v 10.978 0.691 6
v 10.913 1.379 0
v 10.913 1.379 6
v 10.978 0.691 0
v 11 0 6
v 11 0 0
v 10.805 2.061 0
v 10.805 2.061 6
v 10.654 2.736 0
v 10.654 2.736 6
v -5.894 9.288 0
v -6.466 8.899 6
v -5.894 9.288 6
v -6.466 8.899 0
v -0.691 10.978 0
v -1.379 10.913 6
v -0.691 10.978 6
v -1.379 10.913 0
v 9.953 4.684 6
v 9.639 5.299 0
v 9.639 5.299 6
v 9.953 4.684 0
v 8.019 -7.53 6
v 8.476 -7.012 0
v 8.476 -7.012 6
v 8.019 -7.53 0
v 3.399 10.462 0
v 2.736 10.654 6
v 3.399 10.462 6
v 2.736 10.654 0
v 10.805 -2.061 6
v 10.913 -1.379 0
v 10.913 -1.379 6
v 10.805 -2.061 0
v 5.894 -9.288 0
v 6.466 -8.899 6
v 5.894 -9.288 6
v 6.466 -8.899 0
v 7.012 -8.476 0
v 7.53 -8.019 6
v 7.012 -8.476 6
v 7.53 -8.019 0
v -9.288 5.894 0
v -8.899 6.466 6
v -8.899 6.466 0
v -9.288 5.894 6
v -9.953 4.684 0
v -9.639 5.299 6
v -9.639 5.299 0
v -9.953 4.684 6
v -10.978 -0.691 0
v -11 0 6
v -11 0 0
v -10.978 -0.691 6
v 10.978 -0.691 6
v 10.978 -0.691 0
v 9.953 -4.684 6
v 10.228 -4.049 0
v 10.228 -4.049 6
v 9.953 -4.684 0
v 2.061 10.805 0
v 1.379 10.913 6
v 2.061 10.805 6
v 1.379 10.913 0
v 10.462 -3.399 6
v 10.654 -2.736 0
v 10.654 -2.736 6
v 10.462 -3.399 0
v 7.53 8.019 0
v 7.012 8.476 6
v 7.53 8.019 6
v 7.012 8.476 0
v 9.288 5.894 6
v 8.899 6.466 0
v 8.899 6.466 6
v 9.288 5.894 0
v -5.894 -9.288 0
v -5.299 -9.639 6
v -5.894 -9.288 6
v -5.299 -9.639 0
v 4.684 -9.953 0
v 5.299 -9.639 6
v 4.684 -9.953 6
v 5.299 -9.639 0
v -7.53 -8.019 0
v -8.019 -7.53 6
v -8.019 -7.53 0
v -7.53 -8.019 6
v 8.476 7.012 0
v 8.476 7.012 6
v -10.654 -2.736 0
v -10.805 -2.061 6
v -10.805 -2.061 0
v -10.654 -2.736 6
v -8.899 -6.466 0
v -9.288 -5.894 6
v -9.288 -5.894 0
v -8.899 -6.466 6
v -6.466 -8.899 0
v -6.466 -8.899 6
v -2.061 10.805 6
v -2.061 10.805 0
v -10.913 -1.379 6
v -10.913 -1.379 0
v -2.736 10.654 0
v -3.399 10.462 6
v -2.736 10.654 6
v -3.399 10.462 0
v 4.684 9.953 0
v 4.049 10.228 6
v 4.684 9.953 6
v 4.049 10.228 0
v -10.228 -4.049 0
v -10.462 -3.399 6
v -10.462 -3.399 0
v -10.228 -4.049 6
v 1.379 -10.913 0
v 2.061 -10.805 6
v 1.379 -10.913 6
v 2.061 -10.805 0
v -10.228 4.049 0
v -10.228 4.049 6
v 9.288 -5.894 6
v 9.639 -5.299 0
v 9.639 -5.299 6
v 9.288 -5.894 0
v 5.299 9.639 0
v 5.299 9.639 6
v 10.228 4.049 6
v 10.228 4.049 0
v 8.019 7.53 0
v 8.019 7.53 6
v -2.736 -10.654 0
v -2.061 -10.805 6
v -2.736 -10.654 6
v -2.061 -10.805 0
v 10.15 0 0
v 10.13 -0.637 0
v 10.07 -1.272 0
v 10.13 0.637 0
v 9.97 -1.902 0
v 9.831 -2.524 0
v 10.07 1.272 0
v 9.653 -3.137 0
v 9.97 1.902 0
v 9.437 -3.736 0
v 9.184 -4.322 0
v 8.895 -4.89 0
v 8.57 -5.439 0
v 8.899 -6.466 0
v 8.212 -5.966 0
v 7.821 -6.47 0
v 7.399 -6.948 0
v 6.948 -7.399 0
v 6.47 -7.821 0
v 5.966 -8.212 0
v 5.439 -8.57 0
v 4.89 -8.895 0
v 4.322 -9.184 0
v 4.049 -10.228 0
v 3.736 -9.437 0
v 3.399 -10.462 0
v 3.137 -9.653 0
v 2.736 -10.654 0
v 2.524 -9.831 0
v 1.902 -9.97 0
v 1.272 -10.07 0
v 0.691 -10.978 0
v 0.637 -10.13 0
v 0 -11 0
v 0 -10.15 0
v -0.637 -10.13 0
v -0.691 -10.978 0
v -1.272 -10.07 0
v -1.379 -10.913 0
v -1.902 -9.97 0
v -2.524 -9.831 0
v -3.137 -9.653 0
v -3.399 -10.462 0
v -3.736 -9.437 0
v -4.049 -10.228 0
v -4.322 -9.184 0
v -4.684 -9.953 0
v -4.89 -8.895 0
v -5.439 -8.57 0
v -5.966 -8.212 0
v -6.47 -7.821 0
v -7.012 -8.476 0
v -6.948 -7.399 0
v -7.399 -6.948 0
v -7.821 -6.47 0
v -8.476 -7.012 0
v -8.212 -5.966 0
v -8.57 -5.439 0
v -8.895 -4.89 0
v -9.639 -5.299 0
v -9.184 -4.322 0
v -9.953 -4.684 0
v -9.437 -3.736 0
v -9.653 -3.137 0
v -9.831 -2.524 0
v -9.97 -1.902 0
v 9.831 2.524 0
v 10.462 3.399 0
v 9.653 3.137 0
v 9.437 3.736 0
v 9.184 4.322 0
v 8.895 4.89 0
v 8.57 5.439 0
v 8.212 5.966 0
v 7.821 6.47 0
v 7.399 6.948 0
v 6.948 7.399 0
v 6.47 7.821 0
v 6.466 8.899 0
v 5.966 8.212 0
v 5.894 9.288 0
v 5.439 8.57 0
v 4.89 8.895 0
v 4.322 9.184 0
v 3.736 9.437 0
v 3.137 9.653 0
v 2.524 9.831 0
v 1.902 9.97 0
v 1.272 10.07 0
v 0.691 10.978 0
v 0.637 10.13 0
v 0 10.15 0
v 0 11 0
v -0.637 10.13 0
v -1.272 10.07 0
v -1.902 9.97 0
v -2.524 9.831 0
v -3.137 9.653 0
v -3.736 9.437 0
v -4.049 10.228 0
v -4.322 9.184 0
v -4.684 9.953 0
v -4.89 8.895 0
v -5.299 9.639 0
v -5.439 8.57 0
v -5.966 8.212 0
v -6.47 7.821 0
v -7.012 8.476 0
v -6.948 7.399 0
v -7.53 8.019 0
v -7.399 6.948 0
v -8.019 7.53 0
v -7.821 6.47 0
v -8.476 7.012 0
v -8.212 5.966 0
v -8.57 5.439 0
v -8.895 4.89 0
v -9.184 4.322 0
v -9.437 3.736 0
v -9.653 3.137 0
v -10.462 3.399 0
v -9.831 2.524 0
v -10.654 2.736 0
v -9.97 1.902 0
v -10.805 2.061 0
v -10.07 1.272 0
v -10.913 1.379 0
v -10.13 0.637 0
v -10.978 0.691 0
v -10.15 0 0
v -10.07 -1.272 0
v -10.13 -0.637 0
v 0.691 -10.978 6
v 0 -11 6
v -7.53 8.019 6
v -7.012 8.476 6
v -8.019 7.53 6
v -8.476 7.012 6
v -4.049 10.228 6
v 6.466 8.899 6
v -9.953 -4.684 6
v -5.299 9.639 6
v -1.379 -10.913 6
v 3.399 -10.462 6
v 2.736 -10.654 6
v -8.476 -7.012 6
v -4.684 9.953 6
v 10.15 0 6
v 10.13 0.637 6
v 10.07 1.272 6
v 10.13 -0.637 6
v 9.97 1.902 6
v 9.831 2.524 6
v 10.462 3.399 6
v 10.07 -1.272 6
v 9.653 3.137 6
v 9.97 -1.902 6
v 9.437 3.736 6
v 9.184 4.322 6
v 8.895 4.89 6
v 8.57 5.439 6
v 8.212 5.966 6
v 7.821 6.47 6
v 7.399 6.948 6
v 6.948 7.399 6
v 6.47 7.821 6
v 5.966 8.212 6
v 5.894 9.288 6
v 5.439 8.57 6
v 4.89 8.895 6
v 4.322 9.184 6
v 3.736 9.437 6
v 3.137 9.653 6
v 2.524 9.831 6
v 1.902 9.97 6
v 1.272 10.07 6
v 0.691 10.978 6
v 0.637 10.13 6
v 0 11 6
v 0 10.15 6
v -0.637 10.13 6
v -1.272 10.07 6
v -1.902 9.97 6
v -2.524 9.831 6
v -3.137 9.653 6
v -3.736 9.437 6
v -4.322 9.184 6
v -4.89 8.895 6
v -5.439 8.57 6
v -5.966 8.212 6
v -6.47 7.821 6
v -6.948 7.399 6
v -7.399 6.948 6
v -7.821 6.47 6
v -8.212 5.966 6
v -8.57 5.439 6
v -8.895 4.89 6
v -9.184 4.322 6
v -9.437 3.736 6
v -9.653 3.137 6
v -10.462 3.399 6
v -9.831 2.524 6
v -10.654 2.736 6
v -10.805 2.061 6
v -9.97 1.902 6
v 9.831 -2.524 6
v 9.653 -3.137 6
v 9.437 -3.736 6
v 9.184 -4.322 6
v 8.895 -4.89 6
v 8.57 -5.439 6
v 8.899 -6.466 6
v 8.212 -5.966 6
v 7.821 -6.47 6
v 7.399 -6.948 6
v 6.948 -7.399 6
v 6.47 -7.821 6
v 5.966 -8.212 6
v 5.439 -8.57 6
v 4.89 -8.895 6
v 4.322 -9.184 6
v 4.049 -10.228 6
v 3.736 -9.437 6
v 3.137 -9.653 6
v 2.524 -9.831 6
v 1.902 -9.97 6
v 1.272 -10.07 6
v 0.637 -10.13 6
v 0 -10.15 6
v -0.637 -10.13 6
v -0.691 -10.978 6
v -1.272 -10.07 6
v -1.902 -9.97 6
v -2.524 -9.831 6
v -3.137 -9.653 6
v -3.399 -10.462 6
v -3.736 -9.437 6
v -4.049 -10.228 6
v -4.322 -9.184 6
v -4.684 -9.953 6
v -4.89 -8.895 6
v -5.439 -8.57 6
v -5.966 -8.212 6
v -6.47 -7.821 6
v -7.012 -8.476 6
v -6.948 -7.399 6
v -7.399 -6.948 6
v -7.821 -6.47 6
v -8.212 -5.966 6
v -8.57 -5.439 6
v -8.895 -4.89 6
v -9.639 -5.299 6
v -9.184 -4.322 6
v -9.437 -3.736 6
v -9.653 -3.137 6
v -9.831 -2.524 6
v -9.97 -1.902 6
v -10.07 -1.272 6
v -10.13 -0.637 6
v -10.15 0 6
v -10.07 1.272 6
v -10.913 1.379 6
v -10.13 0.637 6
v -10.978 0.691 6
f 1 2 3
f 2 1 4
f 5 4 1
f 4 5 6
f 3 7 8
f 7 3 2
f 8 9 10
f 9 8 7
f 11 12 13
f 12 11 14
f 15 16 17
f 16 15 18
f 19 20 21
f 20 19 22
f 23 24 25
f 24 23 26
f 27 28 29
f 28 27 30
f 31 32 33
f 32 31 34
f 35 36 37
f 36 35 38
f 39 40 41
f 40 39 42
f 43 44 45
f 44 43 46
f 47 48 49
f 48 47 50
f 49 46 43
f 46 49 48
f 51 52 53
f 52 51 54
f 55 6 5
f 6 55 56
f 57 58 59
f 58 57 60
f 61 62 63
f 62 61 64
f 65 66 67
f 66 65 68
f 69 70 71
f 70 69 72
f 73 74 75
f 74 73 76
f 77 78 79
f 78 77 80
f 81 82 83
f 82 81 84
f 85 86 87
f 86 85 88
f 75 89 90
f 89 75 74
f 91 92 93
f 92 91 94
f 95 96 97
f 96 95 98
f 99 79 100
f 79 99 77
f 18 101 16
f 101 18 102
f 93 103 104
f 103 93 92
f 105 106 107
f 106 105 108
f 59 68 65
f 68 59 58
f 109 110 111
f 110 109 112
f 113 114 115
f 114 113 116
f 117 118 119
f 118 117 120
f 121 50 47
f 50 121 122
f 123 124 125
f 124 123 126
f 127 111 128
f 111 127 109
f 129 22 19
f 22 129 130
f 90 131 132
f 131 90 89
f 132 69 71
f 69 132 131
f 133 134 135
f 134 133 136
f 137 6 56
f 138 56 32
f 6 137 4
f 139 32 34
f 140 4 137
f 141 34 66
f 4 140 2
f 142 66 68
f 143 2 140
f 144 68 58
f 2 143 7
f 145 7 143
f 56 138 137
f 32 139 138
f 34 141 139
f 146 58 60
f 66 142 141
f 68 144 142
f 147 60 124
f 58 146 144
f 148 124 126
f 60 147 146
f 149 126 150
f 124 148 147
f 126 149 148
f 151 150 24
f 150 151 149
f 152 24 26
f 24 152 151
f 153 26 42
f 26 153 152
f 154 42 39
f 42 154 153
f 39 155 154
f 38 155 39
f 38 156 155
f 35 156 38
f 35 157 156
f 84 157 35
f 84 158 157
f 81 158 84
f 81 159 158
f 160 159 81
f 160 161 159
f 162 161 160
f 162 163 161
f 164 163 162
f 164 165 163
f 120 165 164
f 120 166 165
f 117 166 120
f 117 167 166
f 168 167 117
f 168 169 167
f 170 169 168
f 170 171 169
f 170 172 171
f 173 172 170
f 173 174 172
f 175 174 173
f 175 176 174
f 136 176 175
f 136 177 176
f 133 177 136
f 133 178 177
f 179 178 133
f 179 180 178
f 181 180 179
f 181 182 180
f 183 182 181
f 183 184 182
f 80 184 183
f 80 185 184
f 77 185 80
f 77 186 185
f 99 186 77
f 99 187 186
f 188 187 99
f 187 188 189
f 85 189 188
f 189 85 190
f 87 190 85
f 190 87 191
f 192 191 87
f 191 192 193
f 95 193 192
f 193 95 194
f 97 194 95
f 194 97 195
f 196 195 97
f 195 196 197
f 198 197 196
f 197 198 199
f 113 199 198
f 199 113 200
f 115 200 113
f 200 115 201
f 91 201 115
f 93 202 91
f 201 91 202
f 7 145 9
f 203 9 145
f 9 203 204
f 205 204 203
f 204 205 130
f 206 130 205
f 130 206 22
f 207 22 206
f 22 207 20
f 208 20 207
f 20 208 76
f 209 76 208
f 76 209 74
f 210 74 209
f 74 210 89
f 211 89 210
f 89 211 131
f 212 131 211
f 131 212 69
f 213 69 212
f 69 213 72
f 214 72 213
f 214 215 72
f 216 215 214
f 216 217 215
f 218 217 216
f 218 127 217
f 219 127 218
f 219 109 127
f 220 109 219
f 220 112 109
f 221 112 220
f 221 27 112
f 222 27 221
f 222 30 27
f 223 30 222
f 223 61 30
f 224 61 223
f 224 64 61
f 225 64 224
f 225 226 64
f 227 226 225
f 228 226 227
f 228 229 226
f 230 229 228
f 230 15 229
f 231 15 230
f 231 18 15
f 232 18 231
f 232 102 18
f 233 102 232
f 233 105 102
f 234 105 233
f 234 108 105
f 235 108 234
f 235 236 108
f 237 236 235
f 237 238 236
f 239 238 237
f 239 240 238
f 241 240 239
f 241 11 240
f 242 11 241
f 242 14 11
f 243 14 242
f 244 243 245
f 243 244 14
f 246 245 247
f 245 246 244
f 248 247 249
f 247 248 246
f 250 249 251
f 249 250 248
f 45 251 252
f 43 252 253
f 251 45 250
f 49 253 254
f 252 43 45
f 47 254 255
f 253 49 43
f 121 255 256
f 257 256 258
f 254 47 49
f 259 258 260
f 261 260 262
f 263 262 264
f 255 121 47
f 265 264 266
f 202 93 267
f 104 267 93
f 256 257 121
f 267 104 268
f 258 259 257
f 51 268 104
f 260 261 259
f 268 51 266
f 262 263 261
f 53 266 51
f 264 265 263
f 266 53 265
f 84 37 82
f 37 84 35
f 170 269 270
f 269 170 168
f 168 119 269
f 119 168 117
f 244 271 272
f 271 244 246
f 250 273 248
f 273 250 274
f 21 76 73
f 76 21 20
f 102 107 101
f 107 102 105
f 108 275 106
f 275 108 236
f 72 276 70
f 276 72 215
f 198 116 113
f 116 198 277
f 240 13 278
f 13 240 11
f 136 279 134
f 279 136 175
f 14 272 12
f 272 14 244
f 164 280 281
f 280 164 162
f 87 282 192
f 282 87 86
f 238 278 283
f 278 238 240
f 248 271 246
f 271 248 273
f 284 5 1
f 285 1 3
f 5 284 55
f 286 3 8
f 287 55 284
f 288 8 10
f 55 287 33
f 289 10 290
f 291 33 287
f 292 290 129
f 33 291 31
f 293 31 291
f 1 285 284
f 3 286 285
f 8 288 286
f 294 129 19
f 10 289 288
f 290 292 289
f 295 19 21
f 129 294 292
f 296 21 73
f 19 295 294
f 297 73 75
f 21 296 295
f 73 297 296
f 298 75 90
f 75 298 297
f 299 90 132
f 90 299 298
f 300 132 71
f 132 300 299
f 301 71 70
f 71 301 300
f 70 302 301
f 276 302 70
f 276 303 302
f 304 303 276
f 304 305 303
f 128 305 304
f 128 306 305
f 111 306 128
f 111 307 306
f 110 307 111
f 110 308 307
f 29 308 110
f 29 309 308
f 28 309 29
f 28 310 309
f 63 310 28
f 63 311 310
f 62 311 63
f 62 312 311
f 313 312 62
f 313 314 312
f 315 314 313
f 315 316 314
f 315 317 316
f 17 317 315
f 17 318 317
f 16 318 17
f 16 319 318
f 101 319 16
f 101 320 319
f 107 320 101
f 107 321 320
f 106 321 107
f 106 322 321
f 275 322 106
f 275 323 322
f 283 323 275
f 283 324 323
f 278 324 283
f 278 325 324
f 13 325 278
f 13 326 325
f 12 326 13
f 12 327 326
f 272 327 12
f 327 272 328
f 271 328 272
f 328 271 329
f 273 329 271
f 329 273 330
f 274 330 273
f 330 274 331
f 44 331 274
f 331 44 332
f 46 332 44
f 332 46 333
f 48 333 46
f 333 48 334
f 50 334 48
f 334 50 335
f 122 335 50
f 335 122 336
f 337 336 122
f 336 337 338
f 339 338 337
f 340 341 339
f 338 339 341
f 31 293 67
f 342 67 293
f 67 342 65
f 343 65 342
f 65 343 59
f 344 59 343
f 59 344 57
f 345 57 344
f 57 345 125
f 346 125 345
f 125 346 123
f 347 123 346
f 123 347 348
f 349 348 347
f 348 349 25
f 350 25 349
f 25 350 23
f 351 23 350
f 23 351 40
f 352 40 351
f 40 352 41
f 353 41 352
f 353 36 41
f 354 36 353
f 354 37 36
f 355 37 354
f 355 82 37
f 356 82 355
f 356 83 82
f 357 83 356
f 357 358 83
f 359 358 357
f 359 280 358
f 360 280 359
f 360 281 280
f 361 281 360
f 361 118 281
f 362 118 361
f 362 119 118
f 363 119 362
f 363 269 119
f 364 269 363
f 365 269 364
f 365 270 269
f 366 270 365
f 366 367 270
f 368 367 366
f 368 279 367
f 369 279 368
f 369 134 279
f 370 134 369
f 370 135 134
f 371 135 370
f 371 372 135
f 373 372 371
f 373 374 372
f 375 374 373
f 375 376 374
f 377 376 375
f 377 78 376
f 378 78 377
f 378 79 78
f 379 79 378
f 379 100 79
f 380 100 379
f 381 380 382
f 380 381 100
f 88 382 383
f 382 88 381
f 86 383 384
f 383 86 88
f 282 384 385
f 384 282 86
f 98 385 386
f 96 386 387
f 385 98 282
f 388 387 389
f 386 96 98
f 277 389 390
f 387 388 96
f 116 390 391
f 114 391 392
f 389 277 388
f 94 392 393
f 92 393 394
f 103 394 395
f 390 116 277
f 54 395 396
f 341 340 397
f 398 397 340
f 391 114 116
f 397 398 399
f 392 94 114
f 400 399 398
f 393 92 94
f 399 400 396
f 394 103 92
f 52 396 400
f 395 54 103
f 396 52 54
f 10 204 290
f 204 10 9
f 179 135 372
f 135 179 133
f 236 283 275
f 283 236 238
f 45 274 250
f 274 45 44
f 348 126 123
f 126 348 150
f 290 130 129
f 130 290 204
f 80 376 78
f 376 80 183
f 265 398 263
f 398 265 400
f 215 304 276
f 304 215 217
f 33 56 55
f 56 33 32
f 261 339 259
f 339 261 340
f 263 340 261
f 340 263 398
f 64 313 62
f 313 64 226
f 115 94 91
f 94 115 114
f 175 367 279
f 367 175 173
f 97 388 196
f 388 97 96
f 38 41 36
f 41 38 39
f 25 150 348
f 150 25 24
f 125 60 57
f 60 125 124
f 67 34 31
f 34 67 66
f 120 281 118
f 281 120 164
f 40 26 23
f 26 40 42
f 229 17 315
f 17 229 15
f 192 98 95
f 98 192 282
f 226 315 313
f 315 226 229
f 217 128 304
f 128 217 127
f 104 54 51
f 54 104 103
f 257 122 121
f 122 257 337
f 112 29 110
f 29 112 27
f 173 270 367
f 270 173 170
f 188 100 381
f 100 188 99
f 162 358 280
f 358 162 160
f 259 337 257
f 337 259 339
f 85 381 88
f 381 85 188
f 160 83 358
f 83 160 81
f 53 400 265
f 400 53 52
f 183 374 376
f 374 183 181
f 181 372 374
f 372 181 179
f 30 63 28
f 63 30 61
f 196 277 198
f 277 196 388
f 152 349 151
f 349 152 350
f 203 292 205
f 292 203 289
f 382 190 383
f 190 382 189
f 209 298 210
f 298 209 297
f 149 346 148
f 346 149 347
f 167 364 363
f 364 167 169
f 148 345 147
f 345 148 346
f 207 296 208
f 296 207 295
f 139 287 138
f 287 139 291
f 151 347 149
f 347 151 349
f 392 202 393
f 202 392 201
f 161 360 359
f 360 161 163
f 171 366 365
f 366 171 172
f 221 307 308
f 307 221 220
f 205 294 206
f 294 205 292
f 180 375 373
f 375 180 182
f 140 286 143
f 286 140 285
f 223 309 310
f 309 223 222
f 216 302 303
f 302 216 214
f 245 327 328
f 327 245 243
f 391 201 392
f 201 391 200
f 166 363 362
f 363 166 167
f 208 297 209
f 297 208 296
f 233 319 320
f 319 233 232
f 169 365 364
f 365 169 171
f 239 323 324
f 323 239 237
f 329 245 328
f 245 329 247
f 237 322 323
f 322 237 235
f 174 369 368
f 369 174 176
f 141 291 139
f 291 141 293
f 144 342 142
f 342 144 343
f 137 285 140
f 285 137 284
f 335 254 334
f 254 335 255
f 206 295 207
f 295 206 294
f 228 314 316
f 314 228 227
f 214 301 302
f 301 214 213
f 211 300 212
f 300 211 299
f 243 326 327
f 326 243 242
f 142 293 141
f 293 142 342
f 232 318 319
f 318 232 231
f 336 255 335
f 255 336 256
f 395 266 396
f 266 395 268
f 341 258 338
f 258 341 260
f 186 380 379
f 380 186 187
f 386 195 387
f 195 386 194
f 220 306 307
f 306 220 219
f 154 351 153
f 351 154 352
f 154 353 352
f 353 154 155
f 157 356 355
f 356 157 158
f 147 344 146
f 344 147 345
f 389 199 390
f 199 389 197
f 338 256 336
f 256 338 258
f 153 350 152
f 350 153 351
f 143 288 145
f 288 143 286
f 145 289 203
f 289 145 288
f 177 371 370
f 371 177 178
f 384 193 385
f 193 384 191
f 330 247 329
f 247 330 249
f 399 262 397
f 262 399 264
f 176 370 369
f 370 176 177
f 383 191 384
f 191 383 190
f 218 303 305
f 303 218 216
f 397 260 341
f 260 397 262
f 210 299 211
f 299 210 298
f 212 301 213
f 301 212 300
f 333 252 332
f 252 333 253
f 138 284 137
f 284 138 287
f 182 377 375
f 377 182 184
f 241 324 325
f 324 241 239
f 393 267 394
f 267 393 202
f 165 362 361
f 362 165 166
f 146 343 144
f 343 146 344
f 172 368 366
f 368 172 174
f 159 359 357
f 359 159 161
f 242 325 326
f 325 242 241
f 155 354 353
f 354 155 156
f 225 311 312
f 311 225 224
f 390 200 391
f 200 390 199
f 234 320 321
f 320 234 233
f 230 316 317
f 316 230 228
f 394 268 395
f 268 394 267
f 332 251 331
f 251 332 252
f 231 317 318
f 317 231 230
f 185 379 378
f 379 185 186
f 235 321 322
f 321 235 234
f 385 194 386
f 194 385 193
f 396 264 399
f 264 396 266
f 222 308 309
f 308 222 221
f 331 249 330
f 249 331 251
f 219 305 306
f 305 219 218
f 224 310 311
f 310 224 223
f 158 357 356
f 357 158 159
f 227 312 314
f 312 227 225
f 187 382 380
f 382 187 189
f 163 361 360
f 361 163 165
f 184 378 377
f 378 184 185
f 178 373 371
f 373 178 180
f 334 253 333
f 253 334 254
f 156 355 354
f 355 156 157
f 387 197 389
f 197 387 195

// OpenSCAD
$fn=100;

difference () {
  cylinder(h=6, d=22);
  cylinder(h=11, d=20.3);    
}






    
    
